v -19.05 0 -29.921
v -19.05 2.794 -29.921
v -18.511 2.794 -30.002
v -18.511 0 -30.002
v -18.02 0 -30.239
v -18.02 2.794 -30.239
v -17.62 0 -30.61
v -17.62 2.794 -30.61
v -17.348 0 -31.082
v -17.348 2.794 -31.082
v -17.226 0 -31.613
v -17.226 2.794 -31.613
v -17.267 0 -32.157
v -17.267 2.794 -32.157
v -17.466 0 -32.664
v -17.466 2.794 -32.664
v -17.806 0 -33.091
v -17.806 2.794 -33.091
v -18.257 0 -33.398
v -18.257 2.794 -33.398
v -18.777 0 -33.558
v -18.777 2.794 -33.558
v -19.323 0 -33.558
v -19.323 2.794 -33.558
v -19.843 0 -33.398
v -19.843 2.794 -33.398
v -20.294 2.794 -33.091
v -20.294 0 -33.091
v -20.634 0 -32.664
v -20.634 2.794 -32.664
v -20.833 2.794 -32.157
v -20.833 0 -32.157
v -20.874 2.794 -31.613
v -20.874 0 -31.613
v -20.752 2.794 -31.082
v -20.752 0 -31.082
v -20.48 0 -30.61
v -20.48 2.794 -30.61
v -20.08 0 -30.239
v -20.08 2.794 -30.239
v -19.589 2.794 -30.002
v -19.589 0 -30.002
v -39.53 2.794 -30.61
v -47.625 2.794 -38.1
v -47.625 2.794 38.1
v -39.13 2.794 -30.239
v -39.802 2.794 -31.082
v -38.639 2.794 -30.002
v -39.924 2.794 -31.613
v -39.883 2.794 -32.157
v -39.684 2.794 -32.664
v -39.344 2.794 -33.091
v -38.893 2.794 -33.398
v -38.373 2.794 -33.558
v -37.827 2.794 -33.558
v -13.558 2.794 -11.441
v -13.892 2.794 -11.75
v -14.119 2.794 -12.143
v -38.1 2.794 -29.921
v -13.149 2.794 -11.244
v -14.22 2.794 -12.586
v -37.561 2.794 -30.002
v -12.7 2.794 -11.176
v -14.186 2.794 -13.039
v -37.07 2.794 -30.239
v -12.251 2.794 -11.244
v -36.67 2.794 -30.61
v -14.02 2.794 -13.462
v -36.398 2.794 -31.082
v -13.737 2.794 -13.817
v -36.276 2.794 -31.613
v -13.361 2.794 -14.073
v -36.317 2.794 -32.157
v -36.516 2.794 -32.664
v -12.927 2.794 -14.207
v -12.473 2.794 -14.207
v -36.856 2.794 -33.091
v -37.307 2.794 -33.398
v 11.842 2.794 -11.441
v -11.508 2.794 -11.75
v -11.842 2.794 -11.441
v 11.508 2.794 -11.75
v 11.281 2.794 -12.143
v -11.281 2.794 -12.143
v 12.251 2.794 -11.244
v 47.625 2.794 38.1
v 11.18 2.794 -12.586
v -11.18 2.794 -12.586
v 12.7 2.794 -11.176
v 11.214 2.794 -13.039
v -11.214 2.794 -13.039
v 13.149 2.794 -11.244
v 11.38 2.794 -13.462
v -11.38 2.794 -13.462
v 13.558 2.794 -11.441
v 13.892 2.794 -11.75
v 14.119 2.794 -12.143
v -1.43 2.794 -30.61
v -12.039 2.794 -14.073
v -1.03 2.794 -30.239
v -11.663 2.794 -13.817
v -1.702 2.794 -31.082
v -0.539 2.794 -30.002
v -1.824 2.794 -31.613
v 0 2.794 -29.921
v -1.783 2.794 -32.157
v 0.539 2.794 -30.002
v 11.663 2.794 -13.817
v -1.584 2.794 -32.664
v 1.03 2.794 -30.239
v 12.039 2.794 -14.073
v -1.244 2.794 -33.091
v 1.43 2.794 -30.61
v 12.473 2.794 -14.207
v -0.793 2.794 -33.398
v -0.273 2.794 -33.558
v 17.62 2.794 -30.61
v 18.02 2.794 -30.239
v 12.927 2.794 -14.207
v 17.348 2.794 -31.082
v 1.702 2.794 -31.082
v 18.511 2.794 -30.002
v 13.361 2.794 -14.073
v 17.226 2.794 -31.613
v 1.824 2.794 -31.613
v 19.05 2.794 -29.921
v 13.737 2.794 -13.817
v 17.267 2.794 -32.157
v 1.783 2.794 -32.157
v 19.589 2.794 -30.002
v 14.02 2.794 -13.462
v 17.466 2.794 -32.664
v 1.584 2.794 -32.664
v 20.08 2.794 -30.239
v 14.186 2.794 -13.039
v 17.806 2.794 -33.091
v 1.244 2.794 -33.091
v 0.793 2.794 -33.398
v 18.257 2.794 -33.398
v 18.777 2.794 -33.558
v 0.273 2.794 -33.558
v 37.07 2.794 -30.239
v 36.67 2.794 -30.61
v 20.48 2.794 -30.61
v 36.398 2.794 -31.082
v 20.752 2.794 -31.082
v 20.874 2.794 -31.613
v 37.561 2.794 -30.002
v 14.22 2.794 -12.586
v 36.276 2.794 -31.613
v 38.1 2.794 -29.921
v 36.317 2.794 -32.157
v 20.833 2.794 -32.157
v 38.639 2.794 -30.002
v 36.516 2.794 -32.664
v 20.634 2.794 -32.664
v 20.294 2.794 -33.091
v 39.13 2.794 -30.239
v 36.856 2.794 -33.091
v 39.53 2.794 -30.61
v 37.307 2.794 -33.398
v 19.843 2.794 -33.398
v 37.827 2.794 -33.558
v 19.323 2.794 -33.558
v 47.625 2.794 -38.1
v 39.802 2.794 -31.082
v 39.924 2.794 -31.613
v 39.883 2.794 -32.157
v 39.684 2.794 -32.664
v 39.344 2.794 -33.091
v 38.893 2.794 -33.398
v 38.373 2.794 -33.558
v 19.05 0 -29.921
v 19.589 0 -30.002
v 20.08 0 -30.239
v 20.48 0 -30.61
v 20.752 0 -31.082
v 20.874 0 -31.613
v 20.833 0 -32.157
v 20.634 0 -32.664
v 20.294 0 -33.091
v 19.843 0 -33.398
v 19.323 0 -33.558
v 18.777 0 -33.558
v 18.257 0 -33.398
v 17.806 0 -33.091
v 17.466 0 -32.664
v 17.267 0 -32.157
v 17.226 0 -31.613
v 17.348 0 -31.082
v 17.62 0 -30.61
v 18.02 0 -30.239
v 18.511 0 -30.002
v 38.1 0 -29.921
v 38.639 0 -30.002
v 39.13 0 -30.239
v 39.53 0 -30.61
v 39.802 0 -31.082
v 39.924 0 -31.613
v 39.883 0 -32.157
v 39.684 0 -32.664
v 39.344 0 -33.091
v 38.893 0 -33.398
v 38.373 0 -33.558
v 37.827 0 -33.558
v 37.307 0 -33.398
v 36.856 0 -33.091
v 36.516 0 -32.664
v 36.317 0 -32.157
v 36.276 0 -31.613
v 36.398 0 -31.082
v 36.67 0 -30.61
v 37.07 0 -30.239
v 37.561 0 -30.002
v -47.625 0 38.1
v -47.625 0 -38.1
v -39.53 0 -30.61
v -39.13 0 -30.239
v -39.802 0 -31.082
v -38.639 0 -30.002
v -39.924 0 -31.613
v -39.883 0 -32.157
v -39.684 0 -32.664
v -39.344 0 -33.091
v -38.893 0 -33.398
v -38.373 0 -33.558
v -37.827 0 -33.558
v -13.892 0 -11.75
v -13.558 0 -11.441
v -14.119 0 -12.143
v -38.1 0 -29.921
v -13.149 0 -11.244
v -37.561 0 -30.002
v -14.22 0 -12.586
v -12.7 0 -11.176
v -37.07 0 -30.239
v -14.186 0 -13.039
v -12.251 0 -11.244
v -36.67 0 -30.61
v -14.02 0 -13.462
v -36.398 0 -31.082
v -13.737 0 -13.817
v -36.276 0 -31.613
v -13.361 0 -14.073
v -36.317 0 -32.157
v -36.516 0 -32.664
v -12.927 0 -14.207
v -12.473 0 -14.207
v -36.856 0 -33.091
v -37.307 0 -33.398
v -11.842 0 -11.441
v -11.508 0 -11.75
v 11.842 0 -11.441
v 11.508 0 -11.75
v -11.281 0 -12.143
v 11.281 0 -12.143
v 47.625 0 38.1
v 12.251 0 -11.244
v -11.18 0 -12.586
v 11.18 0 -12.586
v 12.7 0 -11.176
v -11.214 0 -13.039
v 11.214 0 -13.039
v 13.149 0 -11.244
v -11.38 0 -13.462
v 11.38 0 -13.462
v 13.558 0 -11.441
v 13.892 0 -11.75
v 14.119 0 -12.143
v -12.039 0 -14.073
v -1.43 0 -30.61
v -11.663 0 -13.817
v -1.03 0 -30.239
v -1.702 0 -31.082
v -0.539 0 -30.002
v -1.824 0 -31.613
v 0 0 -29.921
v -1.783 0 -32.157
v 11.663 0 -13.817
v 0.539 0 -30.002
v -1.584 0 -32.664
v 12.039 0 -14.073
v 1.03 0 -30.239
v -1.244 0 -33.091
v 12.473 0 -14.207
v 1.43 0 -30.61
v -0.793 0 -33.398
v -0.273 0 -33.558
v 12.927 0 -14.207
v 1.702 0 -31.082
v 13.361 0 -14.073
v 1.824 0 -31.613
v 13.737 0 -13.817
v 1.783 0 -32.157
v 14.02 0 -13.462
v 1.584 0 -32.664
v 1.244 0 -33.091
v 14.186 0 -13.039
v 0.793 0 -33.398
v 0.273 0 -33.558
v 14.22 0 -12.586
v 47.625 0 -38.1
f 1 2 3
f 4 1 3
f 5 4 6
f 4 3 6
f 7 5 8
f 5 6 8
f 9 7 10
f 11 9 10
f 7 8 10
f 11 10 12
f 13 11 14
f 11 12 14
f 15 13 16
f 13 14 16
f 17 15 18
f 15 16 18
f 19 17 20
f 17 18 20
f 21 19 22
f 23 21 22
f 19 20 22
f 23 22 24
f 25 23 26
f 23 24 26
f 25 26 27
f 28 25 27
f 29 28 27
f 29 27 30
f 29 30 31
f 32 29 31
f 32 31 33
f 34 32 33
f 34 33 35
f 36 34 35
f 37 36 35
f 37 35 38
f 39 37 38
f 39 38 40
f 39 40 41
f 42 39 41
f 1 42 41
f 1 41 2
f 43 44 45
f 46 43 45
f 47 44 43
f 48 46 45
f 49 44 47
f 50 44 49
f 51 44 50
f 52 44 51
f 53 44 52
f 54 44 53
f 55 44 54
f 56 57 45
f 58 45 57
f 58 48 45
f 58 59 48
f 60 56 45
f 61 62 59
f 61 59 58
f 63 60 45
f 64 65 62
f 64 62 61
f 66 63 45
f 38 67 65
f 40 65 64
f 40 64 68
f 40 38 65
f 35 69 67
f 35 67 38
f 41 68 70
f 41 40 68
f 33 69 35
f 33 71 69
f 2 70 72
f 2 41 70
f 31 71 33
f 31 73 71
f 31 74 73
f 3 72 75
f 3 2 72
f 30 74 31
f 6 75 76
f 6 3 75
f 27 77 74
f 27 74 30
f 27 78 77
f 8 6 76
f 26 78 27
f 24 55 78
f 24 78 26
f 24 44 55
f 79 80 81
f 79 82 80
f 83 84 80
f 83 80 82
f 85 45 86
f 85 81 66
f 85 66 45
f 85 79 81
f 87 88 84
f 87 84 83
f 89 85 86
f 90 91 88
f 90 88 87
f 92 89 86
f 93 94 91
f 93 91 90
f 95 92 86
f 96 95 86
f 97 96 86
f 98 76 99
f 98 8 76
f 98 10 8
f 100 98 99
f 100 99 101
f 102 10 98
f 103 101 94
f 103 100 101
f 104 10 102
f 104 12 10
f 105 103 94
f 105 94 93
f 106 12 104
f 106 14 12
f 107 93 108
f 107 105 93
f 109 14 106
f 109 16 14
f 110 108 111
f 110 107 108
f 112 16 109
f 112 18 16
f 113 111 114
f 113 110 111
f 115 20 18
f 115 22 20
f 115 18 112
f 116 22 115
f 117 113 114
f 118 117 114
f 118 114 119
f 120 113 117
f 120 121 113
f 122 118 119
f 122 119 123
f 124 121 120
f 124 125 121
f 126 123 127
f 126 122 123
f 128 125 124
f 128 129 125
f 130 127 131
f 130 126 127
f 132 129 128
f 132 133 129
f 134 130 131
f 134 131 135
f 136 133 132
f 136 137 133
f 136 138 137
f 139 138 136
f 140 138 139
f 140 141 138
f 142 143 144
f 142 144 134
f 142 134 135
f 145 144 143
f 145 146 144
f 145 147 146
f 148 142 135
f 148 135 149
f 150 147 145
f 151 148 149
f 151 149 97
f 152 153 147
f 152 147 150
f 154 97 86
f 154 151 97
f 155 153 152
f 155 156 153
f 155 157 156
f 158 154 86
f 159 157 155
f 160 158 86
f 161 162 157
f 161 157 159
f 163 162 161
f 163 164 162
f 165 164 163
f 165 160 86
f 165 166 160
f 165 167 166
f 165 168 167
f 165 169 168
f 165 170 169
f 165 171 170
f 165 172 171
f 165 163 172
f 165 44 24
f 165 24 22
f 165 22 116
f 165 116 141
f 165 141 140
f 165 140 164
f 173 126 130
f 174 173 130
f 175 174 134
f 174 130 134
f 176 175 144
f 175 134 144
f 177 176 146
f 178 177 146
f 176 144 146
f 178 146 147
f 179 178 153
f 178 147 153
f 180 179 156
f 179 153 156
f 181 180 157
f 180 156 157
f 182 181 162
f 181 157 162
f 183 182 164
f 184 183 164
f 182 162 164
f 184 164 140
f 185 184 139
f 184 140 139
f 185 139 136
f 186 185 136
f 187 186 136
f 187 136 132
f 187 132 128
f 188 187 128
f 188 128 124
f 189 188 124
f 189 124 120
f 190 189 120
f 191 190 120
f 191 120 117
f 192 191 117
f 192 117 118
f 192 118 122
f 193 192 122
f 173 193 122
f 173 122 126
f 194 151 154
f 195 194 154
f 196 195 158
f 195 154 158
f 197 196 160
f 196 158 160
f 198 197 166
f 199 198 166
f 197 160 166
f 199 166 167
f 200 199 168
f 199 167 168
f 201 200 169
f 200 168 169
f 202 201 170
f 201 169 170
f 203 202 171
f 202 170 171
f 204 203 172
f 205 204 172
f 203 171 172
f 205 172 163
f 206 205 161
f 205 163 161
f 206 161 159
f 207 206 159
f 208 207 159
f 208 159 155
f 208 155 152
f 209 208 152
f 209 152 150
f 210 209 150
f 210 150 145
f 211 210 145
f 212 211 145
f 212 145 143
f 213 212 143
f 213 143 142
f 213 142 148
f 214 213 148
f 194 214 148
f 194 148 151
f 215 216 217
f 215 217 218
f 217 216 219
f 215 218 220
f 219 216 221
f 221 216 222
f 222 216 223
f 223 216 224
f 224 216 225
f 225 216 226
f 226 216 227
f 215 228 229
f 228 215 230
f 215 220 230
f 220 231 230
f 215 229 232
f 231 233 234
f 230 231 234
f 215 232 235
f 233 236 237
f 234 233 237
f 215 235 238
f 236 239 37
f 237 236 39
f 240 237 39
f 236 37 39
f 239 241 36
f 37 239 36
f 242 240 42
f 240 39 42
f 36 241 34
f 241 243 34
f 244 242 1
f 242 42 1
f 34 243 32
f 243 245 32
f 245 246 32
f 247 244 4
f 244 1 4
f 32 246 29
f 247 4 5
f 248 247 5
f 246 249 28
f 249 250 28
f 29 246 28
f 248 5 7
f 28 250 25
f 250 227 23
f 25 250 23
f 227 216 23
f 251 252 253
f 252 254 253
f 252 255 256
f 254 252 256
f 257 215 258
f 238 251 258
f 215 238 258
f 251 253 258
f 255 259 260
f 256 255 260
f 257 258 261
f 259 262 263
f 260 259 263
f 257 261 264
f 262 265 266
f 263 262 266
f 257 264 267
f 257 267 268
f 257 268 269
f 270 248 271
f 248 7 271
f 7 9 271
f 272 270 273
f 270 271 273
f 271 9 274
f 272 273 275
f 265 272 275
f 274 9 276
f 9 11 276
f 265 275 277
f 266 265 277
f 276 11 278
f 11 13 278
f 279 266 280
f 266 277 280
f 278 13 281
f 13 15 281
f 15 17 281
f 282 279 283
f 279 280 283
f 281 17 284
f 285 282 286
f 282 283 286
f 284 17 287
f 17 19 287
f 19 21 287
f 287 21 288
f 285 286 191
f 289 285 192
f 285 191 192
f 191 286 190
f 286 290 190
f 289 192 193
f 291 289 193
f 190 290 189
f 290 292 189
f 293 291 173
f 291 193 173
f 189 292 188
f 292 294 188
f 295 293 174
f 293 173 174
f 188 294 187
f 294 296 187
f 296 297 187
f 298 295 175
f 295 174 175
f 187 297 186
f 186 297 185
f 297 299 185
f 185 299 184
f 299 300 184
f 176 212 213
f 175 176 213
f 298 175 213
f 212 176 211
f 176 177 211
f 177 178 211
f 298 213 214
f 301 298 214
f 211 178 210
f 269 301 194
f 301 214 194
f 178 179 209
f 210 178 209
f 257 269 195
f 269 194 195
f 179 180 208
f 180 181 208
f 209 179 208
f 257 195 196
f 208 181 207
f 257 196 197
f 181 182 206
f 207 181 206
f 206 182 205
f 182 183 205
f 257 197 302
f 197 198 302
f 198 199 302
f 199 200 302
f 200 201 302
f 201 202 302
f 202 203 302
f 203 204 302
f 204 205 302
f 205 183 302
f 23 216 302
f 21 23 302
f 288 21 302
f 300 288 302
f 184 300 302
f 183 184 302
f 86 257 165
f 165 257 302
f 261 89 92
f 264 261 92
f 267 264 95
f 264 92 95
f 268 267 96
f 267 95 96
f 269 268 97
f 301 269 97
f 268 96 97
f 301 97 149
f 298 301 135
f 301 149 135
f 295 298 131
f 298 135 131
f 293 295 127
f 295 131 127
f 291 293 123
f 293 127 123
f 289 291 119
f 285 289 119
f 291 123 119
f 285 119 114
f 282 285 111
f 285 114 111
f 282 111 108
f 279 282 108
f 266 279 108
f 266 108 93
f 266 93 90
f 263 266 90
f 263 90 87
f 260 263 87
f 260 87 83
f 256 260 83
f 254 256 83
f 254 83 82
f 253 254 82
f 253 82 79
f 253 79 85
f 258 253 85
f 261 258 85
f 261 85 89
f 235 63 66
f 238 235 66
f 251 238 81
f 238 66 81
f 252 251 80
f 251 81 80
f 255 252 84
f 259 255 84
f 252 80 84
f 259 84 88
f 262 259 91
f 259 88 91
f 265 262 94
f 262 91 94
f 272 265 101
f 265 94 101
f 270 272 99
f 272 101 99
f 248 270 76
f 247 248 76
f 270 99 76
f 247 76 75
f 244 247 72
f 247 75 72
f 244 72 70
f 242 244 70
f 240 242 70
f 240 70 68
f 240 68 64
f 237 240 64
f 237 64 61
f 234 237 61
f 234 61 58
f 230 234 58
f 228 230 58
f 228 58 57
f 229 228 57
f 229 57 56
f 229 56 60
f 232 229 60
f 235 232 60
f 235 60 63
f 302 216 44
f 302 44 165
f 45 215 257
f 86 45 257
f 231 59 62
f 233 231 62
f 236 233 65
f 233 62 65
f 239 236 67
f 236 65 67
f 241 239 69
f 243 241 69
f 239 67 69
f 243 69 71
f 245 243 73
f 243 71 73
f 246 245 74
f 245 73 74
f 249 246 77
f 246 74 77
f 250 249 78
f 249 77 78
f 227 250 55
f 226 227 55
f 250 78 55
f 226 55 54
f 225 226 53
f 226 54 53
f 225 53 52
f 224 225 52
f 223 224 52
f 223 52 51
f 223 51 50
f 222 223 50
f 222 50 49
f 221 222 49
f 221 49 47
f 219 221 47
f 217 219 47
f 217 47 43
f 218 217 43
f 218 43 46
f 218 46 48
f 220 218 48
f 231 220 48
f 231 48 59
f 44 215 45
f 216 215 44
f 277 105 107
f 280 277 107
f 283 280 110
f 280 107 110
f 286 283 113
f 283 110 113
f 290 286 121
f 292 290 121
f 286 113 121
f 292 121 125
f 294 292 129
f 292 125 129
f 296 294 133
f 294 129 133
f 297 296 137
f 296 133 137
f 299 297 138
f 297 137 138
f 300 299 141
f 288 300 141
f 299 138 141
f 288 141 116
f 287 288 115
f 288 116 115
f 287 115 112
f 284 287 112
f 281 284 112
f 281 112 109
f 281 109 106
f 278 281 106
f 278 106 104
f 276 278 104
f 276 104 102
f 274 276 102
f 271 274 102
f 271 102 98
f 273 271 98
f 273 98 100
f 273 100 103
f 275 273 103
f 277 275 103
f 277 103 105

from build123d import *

# Parameters (mm, degrees)
SKETCH1_W           = 95.25
SKETCH1_H           = 76.2
BOSS_EXTRUDE1_DEPTH = 2.794
SKETCH2_R           = 1.8288
CUT_EXTRUDE1_DEPTH  = 62.053722745
SKETCH3_R           = 1.524
CUT_EXTRUDE2_DEPTH  = 62.053722745


with BuildPart() as part:
    # Sketch1 → Boss-Extrude1 (new body)
    with BuildSketch(Plane(origin=(0, 0, 0), x_dir=(1, 0, 0), z_dir=(0, 1, 0))):
        Rectangle(SKETCH1_W, SKETCH1_H)
    extrude(amount=BOSS_EXTRUDE1_DEPTH)

    # Sketch2 → Cut-Extrude1 (cut, through all)
    with BuildSketch(Plane(origin=(0, 2.794, 0), x_dir=(1, 0, 0), z_dir=(0, 1, 0))):
        with Locations(Location((-38.1, 31.75, 0), (0, 0, 270))):
            Circle(SKETCH2_R)
        with Locations(Location((-19.05, 31.75, 0), (0, 0, 270))):
            Circle(SKETCH2_R)
        with Locations(Location((0, 31.75, 0), (0, 0, 270))):
            Circle(SKETCH2_R)
        with Locations(Location((19.05, 31.75, 0), (0, 0, 270))):
            Circle(SKETCH2_R)
        with Locations(Location((38.1, 31.75, 0), (0, 0, 270))):
            Circle(SKETCH2_R)
    extrude(amount=-CUT_EXTRUDE1_DEPTH, mode=Mode.SUBTRACT)

    # Sketch3 → Cut-Extrude2 (cut, through all)
    with BuildSketch(Plane(origin=(0, 2.794, 0), x_dir=(1, 0, 0), z_dir=(0, 1, 0))):
        with Locations(Location((-12.7, 12.7, 0), (0, 0, 270))):
            Circle(SKETCH3_R)
        with Locations(Location((12.7, 12.7, 0), (0, 0, 270))):
            Circle(SKETCH3_R)
    extrude(amount=-CUT_EXTRUDE2_DEPTH, mode=Mode.SUBTRACT)


solid = part.part
